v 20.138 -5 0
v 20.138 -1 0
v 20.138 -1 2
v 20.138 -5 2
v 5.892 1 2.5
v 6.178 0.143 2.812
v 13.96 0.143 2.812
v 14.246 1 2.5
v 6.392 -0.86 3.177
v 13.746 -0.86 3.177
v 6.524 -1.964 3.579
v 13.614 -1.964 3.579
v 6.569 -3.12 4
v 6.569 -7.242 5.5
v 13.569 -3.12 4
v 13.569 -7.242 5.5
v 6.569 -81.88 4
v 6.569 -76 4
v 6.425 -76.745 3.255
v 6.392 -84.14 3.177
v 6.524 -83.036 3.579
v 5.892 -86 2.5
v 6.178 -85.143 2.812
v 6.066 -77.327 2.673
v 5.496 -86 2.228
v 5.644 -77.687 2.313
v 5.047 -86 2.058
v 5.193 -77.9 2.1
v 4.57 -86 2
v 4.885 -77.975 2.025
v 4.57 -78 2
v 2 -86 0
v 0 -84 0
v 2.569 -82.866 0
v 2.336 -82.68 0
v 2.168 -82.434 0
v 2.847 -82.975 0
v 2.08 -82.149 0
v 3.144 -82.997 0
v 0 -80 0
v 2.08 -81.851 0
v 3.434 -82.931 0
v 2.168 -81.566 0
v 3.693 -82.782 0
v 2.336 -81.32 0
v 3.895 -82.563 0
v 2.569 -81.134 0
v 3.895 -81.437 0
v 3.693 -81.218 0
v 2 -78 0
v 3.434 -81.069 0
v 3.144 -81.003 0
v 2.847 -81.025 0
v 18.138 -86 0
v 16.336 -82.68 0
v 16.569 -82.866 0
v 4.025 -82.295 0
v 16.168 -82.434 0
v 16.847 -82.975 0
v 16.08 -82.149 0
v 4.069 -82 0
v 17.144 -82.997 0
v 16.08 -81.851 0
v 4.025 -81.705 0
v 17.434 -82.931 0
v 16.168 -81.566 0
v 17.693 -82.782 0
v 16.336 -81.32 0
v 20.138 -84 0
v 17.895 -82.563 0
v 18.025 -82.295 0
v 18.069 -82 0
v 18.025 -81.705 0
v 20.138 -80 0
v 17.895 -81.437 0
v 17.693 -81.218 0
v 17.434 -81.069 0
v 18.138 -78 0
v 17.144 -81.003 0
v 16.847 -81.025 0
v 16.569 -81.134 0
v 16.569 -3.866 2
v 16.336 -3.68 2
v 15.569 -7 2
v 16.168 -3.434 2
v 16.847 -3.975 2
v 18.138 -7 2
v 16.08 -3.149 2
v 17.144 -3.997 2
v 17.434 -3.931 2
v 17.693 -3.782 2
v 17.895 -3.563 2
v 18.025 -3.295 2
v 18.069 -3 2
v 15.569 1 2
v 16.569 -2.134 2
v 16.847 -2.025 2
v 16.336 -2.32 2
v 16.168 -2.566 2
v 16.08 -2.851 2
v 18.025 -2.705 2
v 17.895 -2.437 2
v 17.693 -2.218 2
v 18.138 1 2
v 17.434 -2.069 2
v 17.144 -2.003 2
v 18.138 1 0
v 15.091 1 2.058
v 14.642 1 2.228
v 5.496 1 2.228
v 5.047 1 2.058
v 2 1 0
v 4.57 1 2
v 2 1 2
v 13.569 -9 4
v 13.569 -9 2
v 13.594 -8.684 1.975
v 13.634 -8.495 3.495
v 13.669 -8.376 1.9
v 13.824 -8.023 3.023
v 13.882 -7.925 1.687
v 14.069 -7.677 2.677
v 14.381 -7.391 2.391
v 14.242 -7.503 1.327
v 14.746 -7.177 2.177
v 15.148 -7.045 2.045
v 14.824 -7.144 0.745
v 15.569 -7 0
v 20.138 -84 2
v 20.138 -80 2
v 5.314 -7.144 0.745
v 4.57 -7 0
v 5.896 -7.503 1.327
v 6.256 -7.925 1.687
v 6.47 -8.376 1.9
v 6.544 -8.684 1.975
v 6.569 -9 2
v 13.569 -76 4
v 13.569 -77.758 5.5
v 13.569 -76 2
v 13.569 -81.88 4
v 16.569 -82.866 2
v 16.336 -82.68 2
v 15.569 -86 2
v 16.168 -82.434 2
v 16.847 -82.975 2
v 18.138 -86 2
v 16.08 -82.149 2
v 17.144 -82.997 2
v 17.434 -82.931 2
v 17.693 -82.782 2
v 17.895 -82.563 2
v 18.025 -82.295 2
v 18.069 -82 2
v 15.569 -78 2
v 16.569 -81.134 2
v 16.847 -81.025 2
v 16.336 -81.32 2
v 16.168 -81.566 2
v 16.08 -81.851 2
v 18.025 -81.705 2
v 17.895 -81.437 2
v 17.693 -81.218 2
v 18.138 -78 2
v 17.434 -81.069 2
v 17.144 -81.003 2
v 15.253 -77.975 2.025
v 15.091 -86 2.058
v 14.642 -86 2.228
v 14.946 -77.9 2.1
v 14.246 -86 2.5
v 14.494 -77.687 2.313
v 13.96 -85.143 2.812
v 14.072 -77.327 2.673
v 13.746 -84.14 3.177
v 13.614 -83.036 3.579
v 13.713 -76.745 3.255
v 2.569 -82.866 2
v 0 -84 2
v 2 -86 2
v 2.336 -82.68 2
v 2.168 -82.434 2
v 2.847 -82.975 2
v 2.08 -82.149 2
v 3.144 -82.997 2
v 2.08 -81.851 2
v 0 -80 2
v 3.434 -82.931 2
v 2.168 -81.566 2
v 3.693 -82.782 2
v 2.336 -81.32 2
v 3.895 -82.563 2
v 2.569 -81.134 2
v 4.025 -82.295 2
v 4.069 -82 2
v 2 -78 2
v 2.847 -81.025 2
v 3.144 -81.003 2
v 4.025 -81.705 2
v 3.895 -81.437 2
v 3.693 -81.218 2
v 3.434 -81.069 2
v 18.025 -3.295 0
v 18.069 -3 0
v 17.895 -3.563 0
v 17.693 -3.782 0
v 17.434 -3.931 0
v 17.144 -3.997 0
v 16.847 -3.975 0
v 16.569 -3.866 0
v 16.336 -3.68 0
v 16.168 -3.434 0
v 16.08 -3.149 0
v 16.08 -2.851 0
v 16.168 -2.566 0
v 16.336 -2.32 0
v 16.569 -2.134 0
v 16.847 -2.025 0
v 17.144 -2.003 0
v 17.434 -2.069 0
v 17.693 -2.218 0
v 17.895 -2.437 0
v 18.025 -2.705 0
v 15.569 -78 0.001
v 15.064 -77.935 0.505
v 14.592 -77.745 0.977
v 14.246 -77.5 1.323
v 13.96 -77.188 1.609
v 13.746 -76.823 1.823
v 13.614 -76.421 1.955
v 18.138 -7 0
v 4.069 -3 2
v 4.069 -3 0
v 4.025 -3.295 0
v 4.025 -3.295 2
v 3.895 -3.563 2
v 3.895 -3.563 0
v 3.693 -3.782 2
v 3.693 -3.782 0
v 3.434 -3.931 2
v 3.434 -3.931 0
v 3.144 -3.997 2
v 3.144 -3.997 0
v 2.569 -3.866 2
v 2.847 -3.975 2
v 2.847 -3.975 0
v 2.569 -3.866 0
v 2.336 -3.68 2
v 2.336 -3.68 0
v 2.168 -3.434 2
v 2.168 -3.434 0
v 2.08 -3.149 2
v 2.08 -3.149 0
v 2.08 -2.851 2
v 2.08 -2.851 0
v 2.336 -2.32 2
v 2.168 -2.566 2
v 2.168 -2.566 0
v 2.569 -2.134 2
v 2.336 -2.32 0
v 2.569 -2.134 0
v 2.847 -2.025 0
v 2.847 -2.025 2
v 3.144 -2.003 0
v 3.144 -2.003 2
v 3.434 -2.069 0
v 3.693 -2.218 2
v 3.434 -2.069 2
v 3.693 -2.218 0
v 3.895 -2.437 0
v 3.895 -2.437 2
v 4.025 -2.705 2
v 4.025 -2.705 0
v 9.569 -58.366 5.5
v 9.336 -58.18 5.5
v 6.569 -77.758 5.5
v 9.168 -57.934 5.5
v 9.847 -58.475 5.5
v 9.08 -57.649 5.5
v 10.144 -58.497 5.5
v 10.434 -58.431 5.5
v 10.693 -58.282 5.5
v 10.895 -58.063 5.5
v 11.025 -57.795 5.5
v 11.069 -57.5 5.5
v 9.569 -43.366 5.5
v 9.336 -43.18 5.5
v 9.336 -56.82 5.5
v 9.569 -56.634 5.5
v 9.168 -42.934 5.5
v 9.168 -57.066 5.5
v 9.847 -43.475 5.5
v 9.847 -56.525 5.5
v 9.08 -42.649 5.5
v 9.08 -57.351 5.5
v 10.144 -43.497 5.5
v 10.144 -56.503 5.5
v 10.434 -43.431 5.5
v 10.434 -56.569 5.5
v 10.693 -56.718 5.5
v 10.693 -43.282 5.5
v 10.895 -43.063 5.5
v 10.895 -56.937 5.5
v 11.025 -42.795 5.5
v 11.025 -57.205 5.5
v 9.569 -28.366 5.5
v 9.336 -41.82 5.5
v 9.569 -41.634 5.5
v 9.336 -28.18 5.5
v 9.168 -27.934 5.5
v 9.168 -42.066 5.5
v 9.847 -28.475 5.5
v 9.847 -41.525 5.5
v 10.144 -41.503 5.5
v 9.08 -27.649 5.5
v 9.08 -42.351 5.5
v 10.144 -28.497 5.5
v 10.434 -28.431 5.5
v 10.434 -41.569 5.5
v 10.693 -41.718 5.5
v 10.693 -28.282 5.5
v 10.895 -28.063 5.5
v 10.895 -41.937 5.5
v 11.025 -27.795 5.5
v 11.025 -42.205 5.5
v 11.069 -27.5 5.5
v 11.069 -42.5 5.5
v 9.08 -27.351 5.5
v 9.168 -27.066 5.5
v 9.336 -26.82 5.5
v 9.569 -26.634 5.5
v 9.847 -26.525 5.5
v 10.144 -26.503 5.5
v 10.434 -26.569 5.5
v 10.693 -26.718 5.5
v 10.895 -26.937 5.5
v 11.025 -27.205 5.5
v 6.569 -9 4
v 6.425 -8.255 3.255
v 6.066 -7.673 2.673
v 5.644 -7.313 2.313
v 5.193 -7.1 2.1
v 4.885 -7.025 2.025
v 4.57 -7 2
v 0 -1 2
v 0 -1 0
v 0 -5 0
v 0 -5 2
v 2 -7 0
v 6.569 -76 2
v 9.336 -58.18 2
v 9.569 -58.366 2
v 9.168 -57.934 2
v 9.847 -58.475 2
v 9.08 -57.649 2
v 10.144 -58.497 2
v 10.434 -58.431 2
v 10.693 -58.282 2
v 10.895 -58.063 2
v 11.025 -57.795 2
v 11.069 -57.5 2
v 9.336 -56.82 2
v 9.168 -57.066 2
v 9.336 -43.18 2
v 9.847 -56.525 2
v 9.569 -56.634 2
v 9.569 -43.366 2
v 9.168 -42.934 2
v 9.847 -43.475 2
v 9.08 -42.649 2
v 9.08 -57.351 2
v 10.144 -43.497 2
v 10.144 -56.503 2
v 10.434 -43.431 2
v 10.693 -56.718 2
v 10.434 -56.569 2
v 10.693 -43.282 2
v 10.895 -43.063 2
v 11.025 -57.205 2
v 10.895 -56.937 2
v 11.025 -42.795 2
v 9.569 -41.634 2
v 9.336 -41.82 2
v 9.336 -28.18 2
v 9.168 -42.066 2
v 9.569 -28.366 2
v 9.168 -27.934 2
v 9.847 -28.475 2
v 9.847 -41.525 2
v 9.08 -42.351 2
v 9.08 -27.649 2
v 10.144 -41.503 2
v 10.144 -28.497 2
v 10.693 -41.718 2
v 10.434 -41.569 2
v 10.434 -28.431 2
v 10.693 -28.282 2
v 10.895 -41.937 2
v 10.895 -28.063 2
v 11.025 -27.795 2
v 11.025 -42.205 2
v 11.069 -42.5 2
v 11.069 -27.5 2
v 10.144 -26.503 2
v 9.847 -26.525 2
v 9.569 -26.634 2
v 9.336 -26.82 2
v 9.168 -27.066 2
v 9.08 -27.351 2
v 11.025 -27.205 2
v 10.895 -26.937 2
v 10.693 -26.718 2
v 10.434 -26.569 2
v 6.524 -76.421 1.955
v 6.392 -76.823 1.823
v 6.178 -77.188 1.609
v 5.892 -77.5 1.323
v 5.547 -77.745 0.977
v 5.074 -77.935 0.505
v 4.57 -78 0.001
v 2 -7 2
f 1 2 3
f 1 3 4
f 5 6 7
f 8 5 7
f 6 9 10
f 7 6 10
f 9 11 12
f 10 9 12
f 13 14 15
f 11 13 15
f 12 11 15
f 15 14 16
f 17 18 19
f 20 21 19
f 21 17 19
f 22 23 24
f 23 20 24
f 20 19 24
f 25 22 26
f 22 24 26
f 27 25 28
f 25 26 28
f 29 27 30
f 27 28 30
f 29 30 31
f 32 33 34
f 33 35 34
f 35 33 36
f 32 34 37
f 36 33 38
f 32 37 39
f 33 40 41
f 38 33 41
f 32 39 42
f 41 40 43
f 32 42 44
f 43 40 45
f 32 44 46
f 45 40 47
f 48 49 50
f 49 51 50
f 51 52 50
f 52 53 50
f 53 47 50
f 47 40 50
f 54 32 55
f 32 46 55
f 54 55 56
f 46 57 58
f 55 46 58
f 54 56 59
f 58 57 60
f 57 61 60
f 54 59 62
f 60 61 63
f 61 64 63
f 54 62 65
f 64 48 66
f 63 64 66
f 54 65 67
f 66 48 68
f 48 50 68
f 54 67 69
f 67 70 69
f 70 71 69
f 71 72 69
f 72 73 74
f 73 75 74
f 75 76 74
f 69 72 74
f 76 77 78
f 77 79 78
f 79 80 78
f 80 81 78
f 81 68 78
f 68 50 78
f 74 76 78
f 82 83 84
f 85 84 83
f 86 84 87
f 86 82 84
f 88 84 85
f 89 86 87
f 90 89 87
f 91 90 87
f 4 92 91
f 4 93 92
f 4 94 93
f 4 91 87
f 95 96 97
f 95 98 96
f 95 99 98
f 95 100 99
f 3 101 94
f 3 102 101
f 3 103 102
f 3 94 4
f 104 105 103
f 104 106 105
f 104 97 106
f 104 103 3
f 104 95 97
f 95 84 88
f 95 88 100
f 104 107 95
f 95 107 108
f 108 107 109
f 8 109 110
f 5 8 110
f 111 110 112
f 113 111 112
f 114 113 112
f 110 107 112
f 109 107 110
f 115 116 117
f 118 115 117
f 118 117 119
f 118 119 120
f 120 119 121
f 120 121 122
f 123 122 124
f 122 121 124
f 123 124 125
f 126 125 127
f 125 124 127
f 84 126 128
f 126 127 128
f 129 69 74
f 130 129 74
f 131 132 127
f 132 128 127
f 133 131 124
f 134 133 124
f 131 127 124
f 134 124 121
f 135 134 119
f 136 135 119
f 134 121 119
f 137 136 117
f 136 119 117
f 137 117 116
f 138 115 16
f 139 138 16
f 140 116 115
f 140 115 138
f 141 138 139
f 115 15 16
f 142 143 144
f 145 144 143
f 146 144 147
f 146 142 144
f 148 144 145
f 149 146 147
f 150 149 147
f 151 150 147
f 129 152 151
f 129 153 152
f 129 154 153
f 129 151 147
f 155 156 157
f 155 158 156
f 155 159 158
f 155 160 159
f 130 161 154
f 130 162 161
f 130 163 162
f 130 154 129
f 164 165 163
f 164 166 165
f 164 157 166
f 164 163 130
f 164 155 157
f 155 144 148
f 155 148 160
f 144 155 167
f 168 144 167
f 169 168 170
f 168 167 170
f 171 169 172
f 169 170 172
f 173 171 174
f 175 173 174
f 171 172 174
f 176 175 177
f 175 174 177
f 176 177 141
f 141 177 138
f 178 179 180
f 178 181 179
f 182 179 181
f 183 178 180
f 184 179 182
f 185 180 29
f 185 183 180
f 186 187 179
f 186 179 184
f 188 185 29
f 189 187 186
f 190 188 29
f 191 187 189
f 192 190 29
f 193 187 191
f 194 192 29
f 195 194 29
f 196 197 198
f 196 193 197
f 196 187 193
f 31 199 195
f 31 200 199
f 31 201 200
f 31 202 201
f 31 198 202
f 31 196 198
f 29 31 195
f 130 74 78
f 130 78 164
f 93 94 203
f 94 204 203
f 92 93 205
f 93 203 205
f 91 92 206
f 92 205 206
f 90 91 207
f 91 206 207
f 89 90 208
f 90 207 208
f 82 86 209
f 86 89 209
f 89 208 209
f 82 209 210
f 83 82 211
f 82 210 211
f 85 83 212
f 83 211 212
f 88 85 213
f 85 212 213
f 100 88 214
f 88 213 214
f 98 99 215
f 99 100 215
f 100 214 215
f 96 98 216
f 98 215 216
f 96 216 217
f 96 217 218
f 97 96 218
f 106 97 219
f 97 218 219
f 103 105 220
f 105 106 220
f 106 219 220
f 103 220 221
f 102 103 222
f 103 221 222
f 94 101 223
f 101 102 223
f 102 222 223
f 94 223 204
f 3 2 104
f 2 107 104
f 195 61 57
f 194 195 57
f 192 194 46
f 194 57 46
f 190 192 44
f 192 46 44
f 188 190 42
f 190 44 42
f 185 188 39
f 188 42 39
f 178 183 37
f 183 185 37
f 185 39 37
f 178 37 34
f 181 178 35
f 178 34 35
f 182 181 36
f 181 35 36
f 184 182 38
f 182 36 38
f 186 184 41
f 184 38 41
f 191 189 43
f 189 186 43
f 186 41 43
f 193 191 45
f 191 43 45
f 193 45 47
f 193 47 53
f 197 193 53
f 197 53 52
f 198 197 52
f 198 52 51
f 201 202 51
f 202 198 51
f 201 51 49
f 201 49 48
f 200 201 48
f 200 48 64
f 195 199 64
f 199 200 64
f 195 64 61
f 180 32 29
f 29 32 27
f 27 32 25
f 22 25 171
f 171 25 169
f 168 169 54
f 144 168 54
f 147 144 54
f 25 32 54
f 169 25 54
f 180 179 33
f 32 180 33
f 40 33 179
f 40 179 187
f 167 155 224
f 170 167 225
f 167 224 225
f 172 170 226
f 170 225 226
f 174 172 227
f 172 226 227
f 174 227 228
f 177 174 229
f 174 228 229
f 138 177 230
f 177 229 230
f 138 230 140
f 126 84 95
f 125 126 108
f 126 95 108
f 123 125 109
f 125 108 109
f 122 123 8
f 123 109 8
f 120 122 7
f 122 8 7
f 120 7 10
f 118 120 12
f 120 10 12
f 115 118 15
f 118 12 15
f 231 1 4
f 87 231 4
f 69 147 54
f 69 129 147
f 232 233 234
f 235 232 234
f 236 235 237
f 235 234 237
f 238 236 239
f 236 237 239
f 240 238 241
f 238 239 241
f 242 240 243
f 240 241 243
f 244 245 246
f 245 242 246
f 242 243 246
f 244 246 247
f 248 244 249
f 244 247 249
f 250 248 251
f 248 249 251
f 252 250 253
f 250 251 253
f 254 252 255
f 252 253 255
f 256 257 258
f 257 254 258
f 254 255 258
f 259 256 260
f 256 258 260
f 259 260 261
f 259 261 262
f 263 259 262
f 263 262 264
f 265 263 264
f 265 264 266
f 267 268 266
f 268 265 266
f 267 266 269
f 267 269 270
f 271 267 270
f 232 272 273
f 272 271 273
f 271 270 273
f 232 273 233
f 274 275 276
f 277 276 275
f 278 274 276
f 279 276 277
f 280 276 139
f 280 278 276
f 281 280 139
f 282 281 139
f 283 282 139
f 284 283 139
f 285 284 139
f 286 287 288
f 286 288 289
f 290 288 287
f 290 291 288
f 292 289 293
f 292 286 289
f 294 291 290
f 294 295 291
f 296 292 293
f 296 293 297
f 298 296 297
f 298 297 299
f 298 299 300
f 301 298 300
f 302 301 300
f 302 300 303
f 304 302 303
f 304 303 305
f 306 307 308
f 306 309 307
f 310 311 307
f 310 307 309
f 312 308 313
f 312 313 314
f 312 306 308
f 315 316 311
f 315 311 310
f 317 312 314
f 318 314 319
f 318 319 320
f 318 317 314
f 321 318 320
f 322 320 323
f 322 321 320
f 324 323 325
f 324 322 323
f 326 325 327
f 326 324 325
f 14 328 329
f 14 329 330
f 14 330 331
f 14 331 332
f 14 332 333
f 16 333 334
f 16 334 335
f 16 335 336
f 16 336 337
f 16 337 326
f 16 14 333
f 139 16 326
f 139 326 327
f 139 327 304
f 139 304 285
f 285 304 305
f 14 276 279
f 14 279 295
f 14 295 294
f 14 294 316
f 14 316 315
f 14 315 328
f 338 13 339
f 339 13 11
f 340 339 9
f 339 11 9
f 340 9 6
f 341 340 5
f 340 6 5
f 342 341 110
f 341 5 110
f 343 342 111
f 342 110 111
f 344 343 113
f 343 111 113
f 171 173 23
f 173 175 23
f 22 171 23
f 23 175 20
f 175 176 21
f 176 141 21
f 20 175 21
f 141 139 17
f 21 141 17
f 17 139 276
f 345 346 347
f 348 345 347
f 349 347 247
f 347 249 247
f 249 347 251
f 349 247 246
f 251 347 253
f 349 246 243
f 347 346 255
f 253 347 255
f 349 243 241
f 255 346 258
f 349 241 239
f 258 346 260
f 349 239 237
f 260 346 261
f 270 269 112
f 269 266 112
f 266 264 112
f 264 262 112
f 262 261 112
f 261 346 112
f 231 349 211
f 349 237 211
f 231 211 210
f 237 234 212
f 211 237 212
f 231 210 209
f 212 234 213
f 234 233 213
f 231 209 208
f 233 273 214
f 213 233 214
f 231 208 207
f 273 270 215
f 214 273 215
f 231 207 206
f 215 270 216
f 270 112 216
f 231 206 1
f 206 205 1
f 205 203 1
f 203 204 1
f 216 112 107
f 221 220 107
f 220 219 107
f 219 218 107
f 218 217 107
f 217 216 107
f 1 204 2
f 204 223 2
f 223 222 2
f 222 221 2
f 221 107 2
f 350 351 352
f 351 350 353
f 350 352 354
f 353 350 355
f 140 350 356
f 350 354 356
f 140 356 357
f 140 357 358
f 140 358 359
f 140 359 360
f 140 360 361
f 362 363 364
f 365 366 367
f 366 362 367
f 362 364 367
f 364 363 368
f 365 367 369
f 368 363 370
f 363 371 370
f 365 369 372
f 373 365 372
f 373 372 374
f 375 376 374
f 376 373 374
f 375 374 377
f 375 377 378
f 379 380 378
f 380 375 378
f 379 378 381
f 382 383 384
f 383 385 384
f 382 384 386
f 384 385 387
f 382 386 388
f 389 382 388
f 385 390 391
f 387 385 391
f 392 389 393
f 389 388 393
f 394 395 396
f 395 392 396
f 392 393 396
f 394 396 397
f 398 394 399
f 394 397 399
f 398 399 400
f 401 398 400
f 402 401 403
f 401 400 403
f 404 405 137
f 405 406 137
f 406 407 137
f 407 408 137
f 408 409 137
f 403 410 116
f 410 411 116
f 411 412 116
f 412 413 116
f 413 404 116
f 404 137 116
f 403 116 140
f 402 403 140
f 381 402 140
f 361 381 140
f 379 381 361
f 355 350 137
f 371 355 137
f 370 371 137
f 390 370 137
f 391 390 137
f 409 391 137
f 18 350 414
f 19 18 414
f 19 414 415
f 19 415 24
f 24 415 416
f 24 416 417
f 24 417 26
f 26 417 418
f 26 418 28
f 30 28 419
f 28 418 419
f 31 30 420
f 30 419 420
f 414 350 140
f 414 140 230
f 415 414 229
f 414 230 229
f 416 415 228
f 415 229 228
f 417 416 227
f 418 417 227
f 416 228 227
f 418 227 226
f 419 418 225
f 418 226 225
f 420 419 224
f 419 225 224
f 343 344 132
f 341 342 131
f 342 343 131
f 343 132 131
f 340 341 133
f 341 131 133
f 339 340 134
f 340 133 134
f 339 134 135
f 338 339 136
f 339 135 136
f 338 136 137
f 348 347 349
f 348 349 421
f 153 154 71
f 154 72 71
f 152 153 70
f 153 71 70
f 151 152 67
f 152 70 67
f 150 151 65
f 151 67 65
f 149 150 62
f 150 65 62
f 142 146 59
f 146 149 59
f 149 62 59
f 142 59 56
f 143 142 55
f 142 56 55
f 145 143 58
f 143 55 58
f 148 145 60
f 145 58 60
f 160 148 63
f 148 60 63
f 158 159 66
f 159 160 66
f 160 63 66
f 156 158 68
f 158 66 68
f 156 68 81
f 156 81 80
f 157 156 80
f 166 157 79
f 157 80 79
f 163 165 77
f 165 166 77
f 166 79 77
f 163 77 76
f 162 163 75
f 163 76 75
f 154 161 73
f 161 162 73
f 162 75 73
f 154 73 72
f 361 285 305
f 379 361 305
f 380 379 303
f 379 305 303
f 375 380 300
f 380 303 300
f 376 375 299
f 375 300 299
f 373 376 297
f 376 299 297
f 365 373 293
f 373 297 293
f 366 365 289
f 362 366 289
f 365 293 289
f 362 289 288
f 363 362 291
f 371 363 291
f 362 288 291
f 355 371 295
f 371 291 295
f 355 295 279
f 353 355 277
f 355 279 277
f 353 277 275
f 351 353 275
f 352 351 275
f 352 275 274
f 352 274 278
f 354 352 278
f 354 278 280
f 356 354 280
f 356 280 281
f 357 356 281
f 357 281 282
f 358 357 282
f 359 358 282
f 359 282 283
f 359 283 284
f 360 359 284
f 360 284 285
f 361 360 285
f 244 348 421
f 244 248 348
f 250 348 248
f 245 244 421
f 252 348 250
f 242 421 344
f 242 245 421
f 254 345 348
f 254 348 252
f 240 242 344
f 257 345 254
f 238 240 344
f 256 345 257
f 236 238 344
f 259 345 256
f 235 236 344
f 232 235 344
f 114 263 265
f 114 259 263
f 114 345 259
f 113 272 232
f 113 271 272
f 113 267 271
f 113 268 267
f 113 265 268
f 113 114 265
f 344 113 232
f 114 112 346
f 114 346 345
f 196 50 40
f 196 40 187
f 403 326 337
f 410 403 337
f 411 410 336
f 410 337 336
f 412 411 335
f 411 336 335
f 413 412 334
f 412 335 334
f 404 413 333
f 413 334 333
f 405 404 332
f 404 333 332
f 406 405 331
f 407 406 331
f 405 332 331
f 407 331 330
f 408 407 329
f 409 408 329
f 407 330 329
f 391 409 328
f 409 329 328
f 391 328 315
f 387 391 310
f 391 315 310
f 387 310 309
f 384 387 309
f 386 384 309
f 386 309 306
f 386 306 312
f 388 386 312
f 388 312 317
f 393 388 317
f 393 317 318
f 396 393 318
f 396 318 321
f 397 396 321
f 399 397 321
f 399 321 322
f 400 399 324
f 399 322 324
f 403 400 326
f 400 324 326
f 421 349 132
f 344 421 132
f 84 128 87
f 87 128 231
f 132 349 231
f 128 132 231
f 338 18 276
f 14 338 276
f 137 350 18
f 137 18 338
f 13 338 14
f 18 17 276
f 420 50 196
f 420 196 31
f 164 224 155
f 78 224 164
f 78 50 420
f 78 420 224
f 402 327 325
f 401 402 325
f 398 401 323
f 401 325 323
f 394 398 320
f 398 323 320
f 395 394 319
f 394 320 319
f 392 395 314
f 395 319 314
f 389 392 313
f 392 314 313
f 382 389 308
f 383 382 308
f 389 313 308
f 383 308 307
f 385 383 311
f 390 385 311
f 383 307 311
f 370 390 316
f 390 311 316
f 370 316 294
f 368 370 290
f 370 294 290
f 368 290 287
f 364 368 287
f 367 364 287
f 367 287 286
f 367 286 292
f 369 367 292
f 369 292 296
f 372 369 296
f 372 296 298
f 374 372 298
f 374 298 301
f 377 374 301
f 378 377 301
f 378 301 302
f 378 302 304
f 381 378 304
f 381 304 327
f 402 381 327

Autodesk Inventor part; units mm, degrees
ref_plane "YZ Plane" through (0, 0, 0) normal (1, 0, 0) x (0, 1, 0)
ref_plane "XZ Plane" through (0, 0, 0) normal (0, 1, 0) x (-1, 0, 0)
ref_plane "XY Plane" through (0, 0, 0) normal (0, 0, 1) x (1, 0, 0)
sketch "Sketch1" plane through (0, 0, 0) normal (0, 0, 1) x (1, 0, 0)
  circle A0 centre (17.0691, -3) radius 1.6 projected
  circle A1 centre (3.0691, -3) radius 1.6 projected
  line L0 (20.1383, 1) -> (0, 1) projected
  line L1 (0, 1) -> (0, -7) projected
  line L2 (0, -7) -> (20.1383, -7) projected
  line L3 (20.1383, 1) -> (20.1383, -7) projected
  circle A2 centre (17.0691, -82) radius 1.6 projected
  circle A3 centre (3.0691, -82) radius 1.6 projected
  line L4 (20.1383, -86) -> (0, -86) projected
  line L5 (20.1383, -86) -> (20.1383, -78) projected
  line L6 (0, -78) -> (20.1383, -78) projected
  line L7 (0, -86) -> (0, -78) projected
  circle A4 centre (3.0691, -3) radius 1
  circle A5 centre (17.0691, -3) radius 1
  circle A6 centre (3.0691, -82) radius 1
  circle A7 centre (17.0691, -82) radius 1
  point P0 (0, 0)
  dimension "d0" = 2
  dimension "d1" = 2
  dimension "d2" = 2
  dimension "d3" = 2
extrude "Extrusion1" add sketch "Sketch1" along normal blind 2 contours A0 | A1 | L3 L2 L1 L0 | A2 | A3 | L4 L7 L6 L5
sketch "Sketch2" plane through (0, 0, 2) normal (0, 0, 1) x (1, 0, 0)
  line L0 (20.1383, -7) -> (20.1383, 1) projected
  line L1 (20.1383, 1) -> (0, 1) projected
  line L2 (0, 1) -> (0, -7) projected
  line L3 (0, -7) -> (20.1383, -7) projected
  circle A0 centre (17.0691, -3) radius 1 projected
  circle A1 centre (3.0691, -3) radius 1 projected
  line L4 (20.1383, -86) -> (20.1383, -78) projected
  line L5 (20.1383, -78) -> (0, -78) projected
  line L6 (0, -78) -> (0, -86) projected
  line L7 (0, -86) -> (20.1383, -86) projected
  circle A2 centre (17.0691, -82) radius 1 projected
  circle A3 centre (3.0691, -82) radius 1 projected
  circle A4 centre (3.0691, -3) radius 1 projected
  line L8 (3.0691, -3) -> (17.0691, -3)
  line L9 (3.0691, -82) -> (17.0691, -82)
  line L10 (10.0691, -82) -> (10.0691, -3)
  line L11 (6.5691, 1) -> (13.5691, 1)
  line L12 (13.5691, 1) -> (13.5691, -86)
  line L13 (13.5691, -86) -> (6.5691, -86)
  line L14 (6.5691, -86) -> (6.5691, 1)
  line L15 (6.5691, 1) -> (13.5691, -86) construction
  line L16 (13.5691, 1) -> (6.5691, -86) construction
  point P0 (0, 0)
  point P1 (10.0691, -42.5)
  dimension "d6" = 7
  dimension "d7" = 87
extrude "Extrusion2" add sketch "Sketch2" along normal blind 3.5 contours L12 L5 L10 L3 | L3 L10 L8 L12 | L12 L8 L14 L1 | L10 L5 L14 L3 | L3 L14 L8 L10 | L12 L9 L10 L5 | L10 L9 L14 L5 | L12 L7 L14 L9
fillet "Fillet1" radius 2 2 edges at (10.0691, -7, 2) (10.0691, -78, 2)
fillet "Fillet2" radius 2 8 edges at (13.5691, -7, 1.0003) (13.5691, -3, 2) (6.5691, -3, 2) (6.5691, -7, 1.0003) (6.5691, -78, 1.0003) (6.5691, -82, 2) (13.5691, -78, 1.0003) (13.5691, -82, 2)
chamfer "Chamfer1" distance 2 angle 45 8 edges at (20.1383, -86, 1) (20.1383, -78, 1) (0, -86, 1) (0, -78, 1) (20.1383, -7, 1) (20.1383, 1, 1) (0, -7, 1) (0, 1, 1)
chamfer "Chamfer2" distance 3 angle 70 1 edges at (10.0691, -86, 5.5) measured on face at (11.6131, -86, 0.7327)
chamfer "Chamfer3" distance 3 angle 70 1 edges at (10.0691, 1, 5.5) measured on face at (11.6131, 1, 0.7327)
sketch "Sketch3" plane through (0, 0, 5.5) normal (0, 0, 1) x (1, 0, 0)
  line L0 (6.5691, -7.2424) -> (13.5691, -7.2424) projected
  line L1 (6.5691, -7.2424) -> (6.5691, -77.7576) projected
  line L2 (13.5691, -77.7576) -> (6.5691, -77.7576) projected
  line L3 (13.5691, -77.7576) -> (13.5691, -7.2424) projected
  line L4 (13.5691, -77.7576) -> (6.5691, -77.7576) projected
  line L5 (10.0691, -77.7576) -> (10.0691, -7.2424)
  circle A0 centre (10.0691, -42.5) radius 1
  line L6 (10.0691, -42.5) -> (10.0691, -27.5)
  circle A1 centre (10.0691, -27.5) radius 1
  line L7 (10.0691, -42.5) -> (10.0691, -57.5)
  circle A2 centre (10.0691, -57.5) radius 1
  point P0 (0, 0)
  dimension "d21" = 2
  dimension "d22" = 15
  dimension "d23" = 2
  dimension "d24" = 15
  dimension "d25" = 2
extrude "Extrusion3" cut sketch "Sketch3" against normal blind 3.5 contours A1 L5 | L5 A1 | A2 L5 | L5 A2 | A0 L5 | L5 A0
properties part number "en_shell_1_wid"
